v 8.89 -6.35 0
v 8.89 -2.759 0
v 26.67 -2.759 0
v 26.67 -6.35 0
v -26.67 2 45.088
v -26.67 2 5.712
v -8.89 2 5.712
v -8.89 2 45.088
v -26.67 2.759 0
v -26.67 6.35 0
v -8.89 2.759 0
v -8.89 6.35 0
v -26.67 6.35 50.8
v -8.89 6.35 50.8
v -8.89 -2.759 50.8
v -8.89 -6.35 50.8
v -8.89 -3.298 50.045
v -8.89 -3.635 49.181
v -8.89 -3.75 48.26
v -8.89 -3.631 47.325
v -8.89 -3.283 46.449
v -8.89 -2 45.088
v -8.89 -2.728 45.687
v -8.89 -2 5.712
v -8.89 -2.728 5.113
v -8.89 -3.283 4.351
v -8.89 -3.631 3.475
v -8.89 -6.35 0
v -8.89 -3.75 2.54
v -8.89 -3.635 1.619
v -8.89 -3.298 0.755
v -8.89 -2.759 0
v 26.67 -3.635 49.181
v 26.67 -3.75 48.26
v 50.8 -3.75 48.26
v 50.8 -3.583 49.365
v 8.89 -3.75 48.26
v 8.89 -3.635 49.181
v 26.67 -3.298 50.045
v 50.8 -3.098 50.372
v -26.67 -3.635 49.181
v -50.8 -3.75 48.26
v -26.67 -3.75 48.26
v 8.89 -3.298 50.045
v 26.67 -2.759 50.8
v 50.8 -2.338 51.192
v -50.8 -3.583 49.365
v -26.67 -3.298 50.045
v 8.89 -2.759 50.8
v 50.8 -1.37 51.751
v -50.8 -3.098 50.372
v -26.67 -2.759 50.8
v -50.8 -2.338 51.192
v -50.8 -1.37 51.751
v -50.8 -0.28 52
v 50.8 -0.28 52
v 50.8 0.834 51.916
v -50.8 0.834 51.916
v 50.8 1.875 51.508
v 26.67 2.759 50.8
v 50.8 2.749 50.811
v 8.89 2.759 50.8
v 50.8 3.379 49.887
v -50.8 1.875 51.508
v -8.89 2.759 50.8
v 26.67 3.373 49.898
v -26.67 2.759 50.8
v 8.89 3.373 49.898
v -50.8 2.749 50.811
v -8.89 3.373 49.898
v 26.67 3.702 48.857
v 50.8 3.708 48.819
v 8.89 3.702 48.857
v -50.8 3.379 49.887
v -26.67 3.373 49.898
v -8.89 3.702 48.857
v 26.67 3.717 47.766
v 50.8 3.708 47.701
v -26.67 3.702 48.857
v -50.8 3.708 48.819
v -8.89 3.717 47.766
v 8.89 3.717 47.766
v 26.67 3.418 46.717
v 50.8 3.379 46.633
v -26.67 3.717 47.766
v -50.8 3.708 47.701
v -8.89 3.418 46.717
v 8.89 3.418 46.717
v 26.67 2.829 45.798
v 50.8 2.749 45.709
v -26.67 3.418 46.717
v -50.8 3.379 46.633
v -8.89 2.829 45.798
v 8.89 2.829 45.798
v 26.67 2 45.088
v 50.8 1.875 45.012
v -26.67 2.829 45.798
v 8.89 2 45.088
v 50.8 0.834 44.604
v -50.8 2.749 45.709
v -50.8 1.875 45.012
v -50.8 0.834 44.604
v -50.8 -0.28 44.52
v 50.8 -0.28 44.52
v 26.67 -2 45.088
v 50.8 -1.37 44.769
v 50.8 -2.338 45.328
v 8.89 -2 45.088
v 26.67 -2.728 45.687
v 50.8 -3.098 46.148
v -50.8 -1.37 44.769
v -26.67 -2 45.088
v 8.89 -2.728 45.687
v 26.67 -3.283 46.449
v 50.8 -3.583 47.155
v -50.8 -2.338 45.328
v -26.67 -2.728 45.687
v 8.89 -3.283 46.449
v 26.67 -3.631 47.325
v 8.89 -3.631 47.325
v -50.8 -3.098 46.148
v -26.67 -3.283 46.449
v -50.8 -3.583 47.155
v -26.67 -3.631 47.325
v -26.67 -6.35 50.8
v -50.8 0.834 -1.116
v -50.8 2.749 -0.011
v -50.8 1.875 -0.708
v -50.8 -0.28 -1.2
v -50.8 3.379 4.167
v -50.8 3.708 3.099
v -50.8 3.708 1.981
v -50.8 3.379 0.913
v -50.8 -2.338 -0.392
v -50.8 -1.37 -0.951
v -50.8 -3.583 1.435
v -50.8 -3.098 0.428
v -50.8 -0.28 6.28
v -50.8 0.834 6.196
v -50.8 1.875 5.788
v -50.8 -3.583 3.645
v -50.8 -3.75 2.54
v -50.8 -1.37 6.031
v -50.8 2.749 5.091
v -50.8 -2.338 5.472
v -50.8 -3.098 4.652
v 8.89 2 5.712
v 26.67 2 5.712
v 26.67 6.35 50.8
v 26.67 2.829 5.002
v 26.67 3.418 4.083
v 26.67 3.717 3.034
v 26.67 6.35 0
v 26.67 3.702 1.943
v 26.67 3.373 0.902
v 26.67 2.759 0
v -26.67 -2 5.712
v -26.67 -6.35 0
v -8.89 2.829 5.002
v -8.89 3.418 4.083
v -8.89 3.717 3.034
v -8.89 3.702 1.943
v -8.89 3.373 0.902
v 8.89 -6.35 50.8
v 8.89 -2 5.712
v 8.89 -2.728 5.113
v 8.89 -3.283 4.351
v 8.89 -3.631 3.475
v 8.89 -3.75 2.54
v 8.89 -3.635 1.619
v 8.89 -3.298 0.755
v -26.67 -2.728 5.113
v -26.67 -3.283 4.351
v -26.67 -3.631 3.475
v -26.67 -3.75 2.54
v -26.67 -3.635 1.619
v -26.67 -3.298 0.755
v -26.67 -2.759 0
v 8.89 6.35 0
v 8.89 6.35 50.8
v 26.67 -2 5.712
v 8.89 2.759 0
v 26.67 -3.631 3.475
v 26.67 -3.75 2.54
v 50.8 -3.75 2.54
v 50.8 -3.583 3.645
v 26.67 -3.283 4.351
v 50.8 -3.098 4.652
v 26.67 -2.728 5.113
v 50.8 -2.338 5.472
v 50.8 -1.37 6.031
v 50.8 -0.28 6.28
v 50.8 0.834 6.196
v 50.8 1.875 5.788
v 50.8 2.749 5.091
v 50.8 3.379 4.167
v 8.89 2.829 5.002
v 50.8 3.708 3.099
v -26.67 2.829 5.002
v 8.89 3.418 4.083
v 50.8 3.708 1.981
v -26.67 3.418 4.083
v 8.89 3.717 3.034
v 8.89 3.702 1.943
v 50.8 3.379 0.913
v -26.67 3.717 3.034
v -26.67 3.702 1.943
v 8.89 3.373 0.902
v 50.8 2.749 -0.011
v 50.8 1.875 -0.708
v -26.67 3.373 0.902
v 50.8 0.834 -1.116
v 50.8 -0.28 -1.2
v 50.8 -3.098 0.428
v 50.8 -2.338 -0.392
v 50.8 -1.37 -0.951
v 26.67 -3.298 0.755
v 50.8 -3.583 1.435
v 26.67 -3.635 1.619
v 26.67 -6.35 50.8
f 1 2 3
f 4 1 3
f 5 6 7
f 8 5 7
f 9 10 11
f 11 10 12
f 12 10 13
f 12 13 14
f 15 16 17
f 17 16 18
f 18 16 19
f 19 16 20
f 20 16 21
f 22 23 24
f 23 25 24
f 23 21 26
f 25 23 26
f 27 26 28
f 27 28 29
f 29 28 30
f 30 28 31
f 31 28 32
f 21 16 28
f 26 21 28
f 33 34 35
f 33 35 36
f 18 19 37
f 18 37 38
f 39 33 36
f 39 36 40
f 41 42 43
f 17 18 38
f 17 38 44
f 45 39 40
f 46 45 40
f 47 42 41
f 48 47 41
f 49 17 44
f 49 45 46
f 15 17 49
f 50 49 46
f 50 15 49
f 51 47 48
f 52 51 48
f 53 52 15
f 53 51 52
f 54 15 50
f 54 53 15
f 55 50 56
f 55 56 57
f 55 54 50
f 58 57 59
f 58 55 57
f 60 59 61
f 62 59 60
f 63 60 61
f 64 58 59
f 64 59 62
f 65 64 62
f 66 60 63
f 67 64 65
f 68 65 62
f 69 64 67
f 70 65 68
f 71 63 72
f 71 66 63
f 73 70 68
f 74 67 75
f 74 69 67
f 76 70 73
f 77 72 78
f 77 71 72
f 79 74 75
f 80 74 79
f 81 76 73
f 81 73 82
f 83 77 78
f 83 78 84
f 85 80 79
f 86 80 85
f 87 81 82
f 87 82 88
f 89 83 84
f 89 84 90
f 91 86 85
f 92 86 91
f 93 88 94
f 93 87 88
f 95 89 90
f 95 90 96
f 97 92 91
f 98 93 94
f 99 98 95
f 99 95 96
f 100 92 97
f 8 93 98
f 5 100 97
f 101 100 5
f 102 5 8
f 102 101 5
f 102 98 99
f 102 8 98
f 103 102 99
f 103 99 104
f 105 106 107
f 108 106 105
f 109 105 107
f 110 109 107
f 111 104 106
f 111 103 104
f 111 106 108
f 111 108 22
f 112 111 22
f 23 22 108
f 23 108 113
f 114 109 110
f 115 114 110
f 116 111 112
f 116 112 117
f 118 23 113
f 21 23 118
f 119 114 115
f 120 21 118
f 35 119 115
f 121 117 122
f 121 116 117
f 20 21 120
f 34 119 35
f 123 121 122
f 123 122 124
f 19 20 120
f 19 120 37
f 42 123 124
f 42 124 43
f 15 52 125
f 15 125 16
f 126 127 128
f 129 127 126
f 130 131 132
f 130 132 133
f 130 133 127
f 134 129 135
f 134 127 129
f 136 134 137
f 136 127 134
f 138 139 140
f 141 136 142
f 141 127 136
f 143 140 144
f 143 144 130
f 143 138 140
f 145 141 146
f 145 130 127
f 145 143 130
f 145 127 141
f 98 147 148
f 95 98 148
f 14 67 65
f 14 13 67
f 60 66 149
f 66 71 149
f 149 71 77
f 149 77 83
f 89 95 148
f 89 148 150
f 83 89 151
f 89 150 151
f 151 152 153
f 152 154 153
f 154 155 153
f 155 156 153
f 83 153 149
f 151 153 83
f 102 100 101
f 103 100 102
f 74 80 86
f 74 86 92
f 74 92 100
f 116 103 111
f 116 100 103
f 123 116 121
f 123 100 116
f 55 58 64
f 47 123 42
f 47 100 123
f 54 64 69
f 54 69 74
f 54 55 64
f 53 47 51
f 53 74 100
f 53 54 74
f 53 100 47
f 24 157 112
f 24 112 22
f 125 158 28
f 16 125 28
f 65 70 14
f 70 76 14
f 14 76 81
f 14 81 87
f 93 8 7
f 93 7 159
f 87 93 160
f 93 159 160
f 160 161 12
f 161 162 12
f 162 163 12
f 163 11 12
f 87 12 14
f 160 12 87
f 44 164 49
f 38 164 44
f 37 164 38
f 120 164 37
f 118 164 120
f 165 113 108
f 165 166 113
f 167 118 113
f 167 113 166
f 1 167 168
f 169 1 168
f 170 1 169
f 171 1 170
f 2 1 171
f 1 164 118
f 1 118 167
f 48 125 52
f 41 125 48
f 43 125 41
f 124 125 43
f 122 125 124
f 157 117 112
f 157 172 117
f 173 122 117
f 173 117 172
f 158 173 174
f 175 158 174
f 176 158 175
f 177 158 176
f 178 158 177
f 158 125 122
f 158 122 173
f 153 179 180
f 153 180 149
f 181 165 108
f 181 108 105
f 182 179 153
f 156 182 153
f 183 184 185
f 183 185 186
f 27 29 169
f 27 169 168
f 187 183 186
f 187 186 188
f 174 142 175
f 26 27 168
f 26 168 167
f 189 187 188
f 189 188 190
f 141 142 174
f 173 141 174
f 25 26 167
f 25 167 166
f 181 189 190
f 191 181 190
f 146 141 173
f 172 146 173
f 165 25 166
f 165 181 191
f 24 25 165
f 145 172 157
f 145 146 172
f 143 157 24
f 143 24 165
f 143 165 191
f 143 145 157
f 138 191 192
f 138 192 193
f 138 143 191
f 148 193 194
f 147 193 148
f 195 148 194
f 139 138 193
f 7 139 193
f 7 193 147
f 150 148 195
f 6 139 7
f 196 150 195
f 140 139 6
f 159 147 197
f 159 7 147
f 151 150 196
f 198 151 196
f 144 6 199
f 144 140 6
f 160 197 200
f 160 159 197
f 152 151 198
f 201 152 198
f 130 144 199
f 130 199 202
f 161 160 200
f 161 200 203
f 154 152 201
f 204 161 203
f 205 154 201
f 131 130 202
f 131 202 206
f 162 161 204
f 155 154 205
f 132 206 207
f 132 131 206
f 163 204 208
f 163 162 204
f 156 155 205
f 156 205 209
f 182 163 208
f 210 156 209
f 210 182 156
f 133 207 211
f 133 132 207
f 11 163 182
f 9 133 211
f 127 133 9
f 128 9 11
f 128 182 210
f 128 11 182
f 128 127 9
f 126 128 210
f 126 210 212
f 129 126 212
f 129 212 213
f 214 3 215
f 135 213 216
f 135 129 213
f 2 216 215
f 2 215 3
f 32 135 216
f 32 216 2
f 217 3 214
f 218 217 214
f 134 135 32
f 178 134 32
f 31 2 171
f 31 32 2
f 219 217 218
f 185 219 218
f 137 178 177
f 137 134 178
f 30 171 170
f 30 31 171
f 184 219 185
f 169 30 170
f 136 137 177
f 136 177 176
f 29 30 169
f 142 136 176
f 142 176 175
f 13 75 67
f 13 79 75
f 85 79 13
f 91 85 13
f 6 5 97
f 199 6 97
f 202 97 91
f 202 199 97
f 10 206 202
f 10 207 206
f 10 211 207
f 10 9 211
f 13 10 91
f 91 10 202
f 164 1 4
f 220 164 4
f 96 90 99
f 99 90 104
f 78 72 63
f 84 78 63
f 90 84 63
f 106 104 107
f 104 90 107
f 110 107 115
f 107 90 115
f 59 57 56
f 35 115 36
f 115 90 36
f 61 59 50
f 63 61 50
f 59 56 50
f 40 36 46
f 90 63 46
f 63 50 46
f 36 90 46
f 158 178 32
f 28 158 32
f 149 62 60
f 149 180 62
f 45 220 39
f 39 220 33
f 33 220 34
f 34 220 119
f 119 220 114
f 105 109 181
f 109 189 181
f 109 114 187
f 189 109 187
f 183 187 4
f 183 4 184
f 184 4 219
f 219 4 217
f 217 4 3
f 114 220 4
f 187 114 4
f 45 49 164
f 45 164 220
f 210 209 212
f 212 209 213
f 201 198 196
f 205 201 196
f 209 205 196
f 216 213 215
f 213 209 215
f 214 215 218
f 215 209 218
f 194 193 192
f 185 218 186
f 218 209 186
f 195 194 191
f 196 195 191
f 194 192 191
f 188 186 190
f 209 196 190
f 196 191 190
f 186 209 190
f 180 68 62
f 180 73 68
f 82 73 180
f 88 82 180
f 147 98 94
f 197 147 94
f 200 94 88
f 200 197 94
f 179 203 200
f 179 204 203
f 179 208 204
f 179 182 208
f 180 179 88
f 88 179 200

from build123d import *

# Parameters (mm, degrees)
F0_W     = 24.13
F0_H     = 4
F0_W_2   = 17.78
F1_DEPTH = 5.08
F0_H_2   = 4.35
F2_DEPTH = 50.8
F3_R     = 3.75
F3_W     = 4
F3_H     = 5.08
F4_DEPTH = 101.6
F6_DEPTH = 5.08
F7_R     = 3.75
F7_W     = 4
F7_H     = 5.08
F8_DEPTH = 101.6


with BuildPart() as f1:
    # F0 (on Top) → F1 (new body)
    with BuildSketch(Plane.XY):
        with Locations((38.735, 0)):
            Rectangle(F0_W, F0_H)
        with Locations((17.78, 0)):
            Rectangle(F0_W_2, F0_H)
        Rectangle(F0_W_2, F0_H)
        with Locations((-17.78, 0)):
            Rectangle(F0_W_2, F0_H)
        with Locations((-38.735, 0)):
            Rectangle(F0_W, F0_H)
    extrude(amount=F1_DEPTH)

    # F0 (on Top) → F2 (join)
    with BuildSketch(Plane.XY):
        with Locations((-17.78, -4.175)):
            Rectangle(F0_W_2, F0_H_2)
        with Locations((17.78, -4.175)):
            Rectangle(F0_W_2, F0_H_2)
        with Locations((-17.78, 4.175)):
            Rectangle(F0_W_2, F0_H_2)
        with Locations((17.78, 4.175)):
            Rectangle(F0_W_2, F0_H_2)
    extrude(amount=F2_DEPTH)

    # F3 (on face) → F4 (join)
    with BuildSketch(Plane(origin=(-50.8, 0, 0), x_dir=(0, -1, 0), z_dir=(-1, 0, 0))):
        with Locations((0, 2.54)):
            Circle(F3_R)
        with Locations((0, 2.54)):
            Rectangle(F3_W, F3_H, mode=Mode.SUBTRACT)
    extrude(amount=-F4_DEPTH)

    # F5 (on face) → F6 (join)
    with BuildSketch(Plane.XY.offset(50.8)):
        Polygon((-8.89, -2), (50.8, -2), (50.8, 2), (-50.8, 2), (-50.8, -2), (-26.67, -2), align=None)
    extrude(amount=-F6_DEPTH)

    # F7 (on face) → F8 (join)
    with BuildSketch(Plane(origin=(-50.8, 0, 0), x_dir=(0, -1, 0), z_dir=(-1, 0, 0))):
        with Locations((0, 48.26)):
            Circle(F7_R)
        with Locations((0, 48.26)):
            Rectangle(F7_W, F7_H, mode=Mode.SUBTRACT)
    extrude(amount=-F8_DEPTH)


solid = f1.part
